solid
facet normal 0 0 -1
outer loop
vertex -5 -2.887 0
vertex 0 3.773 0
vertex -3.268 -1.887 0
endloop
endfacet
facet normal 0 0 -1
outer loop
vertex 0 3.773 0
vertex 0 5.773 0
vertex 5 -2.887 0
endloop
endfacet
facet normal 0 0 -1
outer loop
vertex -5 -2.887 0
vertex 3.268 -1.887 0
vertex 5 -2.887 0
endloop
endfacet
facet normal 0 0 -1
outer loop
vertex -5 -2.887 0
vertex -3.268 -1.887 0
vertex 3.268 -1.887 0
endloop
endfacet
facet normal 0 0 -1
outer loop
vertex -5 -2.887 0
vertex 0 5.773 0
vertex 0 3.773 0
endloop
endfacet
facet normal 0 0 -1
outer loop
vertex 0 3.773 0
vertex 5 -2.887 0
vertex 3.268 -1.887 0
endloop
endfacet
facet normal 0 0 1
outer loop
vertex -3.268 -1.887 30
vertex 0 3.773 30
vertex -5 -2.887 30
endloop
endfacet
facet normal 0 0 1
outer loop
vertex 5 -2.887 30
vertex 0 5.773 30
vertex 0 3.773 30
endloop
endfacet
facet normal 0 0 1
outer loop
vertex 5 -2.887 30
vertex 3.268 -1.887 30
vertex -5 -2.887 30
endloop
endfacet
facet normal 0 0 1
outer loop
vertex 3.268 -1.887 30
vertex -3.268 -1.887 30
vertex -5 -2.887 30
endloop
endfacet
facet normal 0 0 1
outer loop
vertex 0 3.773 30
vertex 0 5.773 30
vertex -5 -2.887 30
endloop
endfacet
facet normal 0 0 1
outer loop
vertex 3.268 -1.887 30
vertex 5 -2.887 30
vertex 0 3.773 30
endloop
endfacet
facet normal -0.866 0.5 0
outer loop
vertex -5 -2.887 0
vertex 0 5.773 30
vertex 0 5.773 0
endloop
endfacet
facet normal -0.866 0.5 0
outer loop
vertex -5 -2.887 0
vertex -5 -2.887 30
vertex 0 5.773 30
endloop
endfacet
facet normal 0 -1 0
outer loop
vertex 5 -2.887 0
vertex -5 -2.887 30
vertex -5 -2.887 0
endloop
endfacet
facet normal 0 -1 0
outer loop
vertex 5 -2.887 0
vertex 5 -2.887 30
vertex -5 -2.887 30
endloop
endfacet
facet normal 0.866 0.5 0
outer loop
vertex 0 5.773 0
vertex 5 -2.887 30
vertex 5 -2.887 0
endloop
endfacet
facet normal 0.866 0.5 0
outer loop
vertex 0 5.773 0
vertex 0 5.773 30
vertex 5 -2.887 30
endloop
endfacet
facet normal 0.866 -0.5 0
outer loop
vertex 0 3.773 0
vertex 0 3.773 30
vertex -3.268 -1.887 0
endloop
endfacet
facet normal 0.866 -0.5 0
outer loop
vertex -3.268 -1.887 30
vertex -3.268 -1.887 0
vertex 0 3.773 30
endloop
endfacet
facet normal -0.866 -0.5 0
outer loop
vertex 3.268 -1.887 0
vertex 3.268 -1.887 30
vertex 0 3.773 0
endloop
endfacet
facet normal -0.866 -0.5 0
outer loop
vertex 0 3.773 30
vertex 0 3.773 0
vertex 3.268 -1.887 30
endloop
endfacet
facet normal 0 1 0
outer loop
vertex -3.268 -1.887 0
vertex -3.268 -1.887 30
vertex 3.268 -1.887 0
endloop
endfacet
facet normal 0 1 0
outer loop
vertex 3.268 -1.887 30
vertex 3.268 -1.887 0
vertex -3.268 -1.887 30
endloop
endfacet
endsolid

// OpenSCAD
// variables
side_length = 10; // [10:400]
height = 30; // [1:400]
wallthickness = 1; // [1:30]
// calculations
scale = (side_length*(sqrt(3)/2)-(3*wallthickness))/(side_length*(sqrt(3)/2));
// model
linear_extrude(height=height) difference(){
polygon(points=[[-side_length/2,-tan(30)*side_length/2],[side_length/2,-tan(30)*side_length/2],[0,side_length/2/cos(30)]]);
scale([scale,scale,0]) polygon(points=[[-side_length/2,-tan(30)*side_length/2],[side_length/2,-tan(30)*side_length/2],[0,side_length/2/cos(30)]]);
}
